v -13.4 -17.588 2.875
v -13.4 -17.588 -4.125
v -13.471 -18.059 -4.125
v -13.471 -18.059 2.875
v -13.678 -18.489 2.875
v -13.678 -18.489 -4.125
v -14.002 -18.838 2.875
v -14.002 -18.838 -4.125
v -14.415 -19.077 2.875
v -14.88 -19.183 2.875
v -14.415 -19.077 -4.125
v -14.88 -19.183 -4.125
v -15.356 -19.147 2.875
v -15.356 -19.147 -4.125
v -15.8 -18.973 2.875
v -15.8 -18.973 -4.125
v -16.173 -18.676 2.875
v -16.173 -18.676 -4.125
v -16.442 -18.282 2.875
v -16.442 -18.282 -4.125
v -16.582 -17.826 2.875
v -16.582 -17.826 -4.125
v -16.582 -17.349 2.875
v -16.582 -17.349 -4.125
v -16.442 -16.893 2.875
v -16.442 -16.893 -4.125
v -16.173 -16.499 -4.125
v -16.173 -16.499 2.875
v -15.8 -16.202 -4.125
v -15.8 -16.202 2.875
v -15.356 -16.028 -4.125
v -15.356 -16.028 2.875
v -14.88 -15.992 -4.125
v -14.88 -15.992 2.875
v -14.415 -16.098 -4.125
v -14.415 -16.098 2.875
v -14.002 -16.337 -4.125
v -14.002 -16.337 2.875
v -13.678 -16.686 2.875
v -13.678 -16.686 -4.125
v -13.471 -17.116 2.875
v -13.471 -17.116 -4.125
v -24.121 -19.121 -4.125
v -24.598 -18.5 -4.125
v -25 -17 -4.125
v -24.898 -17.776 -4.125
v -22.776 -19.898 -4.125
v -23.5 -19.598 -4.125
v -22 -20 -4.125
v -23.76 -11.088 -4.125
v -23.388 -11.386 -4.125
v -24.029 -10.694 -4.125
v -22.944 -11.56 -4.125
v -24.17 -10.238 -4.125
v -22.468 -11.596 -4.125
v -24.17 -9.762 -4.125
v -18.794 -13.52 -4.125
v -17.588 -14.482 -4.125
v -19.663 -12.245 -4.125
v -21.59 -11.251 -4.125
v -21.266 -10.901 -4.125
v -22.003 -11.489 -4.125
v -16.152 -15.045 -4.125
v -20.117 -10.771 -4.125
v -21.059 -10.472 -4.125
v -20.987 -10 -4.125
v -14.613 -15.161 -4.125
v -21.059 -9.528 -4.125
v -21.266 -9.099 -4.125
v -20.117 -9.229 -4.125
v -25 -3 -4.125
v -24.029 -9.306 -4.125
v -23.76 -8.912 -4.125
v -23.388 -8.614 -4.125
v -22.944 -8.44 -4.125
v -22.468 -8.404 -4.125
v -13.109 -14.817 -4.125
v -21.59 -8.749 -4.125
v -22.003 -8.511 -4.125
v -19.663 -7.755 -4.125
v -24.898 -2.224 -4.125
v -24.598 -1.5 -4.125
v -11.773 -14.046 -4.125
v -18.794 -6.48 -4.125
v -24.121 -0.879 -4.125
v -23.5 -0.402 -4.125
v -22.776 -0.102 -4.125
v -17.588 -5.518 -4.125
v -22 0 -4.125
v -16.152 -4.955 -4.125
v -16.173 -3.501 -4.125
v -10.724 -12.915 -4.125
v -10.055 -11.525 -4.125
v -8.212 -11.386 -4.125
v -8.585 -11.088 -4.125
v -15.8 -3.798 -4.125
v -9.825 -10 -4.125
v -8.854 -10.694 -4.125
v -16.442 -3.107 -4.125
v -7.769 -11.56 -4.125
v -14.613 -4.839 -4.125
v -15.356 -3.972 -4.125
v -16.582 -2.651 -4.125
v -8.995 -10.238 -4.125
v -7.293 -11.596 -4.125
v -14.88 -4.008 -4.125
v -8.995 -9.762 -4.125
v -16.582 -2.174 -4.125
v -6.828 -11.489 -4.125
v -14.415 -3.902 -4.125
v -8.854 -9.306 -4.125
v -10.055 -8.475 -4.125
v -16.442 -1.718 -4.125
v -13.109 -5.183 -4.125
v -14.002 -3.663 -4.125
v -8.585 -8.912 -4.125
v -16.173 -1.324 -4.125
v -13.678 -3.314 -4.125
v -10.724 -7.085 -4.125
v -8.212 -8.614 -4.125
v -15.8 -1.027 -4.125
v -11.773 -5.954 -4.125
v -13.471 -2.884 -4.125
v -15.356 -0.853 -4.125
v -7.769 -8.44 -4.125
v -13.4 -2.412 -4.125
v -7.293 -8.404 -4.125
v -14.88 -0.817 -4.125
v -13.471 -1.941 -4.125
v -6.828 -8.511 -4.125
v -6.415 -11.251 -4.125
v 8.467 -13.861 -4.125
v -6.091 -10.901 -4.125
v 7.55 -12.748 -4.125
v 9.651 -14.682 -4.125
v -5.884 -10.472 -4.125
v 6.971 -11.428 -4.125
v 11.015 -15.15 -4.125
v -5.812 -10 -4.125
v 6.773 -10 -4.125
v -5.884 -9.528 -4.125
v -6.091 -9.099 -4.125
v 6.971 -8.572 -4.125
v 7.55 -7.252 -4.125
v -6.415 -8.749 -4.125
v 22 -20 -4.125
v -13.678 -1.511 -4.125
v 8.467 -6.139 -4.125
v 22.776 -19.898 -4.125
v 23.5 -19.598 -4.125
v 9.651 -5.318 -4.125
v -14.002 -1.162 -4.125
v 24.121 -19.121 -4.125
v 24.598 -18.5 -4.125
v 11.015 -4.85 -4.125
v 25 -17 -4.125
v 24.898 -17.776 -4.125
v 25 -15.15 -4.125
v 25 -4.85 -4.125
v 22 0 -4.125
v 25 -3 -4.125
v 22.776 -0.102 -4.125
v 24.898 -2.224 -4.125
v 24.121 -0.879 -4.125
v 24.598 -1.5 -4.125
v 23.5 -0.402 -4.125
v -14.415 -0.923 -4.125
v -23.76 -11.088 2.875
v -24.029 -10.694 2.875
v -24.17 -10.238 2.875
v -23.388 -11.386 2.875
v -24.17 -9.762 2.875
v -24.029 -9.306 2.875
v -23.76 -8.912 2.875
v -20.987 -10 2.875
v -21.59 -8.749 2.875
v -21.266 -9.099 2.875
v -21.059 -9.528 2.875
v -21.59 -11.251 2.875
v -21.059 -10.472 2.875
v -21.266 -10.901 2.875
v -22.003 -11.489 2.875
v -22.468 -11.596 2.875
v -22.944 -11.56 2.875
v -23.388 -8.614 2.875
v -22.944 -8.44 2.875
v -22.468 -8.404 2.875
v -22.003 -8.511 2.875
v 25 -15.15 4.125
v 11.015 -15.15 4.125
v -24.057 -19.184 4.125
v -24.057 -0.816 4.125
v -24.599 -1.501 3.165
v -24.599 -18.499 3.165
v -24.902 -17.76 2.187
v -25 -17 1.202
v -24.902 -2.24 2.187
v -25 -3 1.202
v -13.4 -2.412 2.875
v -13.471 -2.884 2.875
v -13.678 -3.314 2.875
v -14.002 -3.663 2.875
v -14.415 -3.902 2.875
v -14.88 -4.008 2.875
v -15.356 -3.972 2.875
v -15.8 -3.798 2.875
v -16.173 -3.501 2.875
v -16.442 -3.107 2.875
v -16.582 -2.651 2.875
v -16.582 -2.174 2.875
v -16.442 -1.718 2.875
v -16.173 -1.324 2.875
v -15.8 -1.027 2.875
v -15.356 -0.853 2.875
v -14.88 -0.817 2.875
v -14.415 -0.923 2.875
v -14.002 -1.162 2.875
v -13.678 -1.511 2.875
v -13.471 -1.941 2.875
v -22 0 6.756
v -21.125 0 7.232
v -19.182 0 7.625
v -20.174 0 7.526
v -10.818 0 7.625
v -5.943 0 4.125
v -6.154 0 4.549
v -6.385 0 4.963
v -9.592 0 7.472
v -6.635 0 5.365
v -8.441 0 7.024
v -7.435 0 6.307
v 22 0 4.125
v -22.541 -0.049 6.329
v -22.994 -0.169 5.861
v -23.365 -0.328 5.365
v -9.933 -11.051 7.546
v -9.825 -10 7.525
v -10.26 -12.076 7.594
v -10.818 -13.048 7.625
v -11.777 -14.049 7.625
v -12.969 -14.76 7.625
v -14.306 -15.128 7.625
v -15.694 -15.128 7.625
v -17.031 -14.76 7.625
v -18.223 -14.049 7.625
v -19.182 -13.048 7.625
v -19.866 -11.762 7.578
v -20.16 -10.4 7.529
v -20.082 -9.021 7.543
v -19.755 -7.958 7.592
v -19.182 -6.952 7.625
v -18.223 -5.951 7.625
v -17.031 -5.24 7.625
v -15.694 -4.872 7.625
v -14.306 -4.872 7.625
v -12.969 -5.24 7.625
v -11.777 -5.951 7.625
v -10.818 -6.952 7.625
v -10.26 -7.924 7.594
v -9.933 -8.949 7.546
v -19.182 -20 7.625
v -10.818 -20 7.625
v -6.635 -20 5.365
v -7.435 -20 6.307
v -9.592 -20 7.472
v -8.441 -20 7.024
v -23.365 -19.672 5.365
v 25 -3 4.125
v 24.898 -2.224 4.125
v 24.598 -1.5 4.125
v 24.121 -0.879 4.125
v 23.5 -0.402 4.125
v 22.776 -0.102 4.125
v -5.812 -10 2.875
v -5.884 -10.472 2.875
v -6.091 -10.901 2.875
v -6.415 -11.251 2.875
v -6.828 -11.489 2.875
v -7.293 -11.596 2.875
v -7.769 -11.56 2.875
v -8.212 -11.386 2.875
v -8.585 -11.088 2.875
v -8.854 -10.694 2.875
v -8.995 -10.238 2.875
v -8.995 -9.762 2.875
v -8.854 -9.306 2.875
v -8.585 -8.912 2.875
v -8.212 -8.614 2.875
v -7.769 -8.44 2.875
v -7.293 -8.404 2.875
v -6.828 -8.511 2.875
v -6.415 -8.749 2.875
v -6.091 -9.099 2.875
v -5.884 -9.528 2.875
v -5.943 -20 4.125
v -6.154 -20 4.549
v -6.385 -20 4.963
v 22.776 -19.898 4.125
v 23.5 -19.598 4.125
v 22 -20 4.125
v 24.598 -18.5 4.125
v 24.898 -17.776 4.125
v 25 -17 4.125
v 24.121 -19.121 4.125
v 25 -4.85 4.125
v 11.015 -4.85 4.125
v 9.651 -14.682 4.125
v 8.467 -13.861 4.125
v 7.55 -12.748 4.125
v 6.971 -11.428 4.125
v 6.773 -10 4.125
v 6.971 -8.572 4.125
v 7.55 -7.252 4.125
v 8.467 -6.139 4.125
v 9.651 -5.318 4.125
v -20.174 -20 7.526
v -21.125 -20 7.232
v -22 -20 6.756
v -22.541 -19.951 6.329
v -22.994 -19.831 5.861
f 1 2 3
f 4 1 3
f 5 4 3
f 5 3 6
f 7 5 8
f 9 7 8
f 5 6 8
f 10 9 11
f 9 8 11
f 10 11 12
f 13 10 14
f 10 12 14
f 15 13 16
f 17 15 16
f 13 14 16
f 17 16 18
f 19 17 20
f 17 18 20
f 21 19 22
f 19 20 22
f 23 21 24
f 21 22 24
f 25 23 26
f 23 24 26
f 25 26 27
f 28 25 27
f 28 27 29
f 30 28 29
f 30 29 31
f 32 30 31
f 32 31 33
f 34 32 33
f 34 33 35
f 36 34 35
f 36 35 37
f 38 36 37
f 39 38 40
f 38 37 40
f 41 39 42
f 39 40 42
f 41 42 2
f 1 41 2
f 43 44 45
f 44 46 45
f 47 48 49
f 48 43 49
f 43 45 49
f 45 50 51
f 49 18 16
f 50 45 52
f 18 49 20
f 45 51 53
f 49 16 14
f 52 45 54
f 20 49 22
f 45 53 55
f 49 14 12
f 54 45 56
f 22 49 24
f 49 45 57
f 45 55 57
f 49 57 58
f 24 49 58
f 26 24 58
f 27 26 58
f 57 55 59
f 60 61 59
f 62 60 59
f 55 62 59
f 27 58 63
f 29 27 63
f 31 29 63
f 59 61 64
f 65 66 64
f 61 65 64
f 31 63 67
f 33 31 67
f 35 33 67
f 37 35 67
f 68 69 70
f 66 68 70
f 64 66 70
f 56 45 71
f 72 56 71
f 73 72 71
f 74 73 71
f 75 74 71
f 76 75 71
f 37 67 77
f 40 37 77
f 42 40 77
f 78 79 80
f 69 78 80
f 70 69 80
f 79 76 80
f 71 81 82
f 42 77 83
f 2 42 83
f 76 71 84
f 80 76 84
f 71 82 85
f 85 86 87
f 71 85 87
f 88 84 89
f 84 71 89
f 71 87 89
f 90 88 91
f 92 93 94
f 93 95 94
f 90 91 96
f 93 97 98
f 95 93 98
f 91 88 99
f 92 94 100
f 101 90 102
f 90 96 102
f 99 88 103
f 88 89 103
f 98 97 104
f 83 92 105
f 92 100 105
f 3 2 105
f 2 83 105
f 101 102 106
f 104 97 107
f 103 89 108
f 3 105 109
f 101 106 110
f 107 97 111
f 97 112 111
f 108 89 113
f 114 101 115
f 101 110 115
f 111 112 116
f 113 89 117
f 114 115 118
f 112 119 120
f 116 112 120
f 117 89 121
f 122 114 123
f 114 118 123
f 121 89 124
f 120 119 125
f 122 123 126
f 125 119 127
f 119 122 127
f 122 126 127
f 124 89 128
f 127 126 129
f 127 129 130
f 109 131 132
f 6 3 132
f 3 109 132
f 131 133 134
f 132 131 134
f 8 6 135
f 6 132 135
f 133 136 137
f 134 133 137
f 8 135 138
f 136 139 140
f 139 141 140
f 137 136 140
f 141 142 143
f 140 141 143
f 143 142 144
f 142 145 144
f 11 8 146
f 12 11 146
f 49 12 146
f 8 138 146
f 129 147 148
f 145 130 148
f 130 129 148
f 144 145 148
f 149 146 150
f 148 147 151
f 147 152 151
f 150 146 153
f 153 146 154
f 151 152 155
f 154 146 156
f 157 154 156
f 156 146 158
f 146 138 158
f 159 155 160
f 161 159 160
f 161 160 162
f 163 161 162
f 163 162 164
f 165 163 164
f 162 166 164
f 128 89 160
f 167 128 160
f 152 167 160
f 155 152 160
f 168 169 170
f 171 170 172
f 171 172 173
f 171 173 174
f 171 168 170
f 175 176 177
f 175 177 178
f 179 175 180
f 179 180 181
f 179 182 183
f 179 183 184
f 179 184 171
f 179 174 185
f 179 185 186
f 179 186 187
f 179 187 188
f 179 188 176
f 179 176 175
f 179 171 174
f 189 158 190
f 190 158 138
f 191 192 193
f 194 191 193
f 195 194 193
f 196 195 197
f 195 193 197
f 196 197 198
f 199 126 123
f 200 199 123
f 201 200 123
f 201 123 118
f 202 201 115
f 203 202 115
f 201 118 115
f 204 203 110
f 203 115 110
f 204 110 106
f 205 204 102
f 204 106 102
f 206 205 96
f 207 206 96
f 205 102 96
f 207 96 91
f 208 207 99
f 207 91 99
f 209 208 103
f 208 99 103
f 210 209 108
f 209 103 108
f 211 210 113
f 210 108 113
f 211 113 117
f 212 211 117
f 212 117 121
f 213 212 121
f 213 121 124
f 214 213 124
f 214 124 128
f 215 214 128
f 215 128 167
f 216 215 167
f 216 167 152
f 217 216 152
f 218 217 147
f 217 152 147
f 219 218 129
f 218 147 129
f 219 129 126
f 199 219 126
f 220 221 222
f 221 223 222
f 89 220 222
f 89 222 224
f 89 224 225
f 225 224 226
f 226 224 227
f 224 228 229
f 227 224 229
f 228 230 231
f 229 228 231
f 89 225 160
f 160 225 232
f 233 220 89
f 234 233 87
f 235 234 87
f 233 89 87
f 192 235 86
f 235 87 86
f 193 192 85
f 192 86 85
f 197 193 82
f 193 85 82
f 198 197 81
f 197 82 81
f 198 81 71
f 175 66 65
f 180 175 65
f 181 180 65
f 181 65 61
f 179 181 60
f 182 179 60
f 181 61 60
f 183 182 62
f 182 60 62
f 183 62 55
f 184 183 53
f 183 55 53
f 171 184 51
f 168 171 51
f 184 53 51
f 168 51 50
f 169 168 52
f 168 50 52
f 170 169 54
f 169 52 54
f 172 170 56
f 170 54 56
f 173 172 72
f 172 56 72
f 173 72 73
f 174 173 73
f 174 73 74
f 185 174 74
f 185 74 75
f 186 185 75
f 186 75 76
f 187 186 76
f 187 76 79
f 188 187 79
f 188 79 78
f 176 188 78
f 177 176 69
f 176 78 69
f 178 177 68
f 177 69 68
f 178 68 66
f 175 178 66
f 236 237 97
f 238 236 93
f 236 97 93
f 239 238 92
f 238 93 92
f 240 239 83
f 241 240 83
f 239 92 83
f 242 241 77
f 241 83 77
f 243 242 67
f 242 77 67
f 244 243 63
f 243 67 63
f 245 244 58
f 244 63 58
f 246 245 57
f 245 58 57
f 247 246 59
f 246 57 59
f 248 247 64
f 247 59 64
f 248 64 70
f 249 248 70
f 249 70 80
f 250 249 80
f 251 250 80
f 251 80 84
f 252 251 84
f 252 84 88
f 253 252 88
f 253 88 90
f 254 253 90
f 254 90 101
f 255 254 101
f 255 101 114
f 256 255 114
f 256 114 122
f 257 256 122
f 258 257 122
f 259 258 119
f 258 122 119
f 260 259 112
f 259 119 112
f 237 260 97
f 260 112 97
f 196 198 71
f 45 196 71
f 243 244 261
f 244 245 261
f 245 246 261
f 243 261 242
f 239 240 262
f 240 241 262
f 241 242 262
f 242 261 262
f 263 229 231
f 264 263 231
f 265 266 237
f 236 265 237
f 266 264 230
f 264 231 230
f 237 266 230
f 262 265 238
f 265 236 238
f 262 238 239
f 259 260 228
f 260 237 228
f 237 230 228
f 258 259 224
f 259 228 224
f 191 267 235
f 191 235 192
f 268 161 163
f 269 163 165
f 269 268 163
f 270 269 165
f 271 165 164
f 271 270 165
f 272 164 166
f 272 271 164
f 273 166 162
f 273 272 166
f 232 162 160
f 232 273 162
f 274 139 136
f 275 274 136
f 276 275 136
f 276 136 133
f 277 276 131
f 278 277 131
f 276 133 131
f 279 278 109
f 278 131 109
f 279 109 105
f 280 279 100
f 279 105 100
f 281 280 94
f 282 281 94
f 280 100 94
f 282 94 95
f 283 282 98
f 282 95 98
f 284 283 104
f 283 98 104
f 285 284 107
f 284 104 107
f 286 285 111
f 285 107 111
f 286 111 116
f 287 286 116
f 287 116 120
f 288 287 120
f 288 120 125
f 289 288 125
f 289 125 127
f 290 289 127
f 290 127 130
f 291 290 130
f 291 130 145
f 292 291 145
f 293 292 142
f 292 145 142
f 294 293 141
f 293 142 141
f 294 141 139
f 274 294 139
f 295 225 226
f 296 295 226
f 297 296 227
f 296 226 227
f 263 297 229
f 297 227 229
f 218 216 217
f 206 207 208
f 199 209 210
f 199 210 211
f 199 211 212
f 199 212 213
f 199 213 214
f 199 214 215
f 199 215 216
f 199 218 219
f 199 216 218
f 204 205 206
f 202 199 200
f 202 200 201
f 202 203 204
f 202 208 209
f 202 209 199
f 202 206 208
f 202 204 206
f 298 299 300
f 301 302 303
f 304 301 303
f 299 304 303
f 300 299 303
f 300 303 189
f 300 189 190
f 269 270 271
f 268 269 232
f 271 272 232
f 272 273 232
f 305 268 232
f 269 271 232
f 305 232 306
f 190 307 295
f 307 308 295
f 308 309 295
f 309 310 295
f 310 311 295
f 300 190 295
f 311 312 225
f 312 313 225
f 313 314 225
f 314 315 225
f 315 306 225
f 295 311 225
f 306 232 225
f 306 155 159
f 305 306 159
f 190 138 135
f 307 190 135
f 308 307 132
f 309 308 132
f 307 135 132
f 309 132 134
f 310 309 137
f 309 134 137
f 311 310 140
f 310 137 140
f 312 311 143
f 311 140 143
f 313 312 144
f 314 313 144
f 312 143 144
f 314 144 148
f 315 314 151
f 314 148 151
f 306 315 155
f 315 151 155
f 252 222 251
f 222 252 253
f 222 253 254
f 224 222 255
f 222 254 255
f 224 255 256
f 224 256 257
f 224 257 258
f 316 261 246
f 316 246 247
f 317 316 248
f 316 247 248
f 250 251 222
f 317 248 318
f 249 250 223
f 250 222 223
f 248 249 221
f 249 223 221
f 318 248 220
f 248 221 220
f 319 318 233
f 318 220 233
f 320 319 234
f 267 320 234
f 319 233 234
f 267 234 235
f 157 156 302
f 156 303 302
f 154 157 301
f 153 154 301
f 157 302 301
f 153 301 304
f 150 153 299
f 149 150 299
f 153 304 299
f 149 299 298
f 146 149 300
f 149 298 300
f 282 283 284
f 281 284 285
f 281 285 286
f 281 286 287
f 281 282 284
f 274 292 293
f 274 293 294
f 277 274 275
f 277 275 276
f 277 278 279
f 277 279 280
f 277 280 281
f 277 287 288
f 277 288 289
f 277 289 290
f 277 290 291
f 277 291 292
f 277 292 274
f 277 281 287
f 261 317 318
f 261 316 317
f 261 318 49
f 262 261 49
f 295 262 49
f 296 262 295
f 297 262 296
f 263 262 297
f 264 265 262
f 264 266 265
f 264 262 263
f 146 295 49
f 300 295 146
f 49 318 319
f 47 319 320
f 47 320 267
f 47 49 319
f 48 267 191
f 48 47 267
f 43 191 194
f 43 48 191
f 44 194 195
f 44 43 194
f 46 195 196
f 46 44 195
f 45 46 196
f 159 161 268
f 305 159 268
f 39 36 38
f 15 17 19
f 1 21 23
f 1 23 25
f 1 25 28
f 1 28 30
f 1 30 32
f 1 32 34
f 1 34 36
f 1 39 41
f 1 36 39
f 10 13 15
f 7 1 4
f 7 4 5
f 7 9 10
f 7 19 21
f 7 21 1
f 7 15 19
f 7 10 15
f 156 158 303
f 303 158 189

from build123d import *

# Parameters (mm, degrees)
F1_DEPTH     = 20
F2_R         = 1.6
F2_R_2       = 5.175
F3_DEPTH     = 7
F4_DEPTH     = 25
F5_R         = 3
F6_T1_DEPTH  = 28.6148731674
F7_DEPTH     = 25
F9_DEPTH     = 25
F10_T1_DEPTH = 35.1990481771


# Not quite as in the source:
# - a fillet or chamfer that OpenCascade refuses, or shapes differently, is made with other operations: its cross-section is extruded or revolved along the edge and cut away or added
# - a feature names something its author has since deleted; it is built from what else it names


with BuildPart() as f1:
    # F0 (on Front) → F1 (new body)
    with BuildSketch(Plane.XZ):
        with BuildLine():
            Line((-25, -4.125), (25, -4.125))
            Line((25, -4.125), (25, 4.125))
            Line((25, 4.125), (-5.9433734098, 4.125))
            ThreePointArc((-5.9433734098, 4.125), (-15, 9.8850100464), (-24.0566265902, 4.125))
            Line((-24.0566265902, 4.125), (-25, 4.125))
            Line((-25, 4.125), (-25, -4.125))
        make_face()
    extrude(amount=F1_DEPTH)

    # F2 (on face) → F3 (cut)
    with BuildSketch(Plane(origin=(0, 0, -4.125), x_dir=(1, 0, 0), z_dir=(0, 0, -1))):
        with Locations((-22.5875, 10)):
            Circle(F2_R)
        with Locations((-15, 10)):
            Circle(F2_R_2)
        with Locations((-15, 17.5875)):
            Circle(F2_R)
        with Locations((-15, 2.4125)):
            Circle(F2_R)
        with Locations((-7.4125, 10)):
            Circle(F2_R)
    extrude(amount=-F3_DEPTH, mode=Mode.SUBTRACT)

    # F4 (cut): a face of the model
    f4_faces = [f1.faces().sort_by_distance(p)[0] for p in [
        (-15, -10, 2.875),
    ]]
    extrude(f4_faces, amount=-F4_DEPTH, mode=Mode.SUBTRACT)

    # F5
    f5_edges = [f1.edges().sort_by_distance(p)[0] for p in [
        (25, 0, 0),
        (25, -20, 0),
        (-25, 0, 0),
        (-25, -20, 0),
    ]]
    fillet(f5_edges, radius=F5_R)

    # F6: fillet of radius 5 on 1 edges, made by hand

    # F6_s2 → F6_t1 (cut)
    with BuildSketch(Plane.XZ.offset(-4.3074365837)):
        with BuildLine():
            ThreePointArc((-24.0566265902, 4.125), (-24.7583155082, 2.7377445871), (-25, 1.2020253665))
            Line((-25, 1.2020253665), (-25, 4.125))
            Line((-25, 4.125), (-24.0566265902, 4.125))
        make_face()
    extrude(amount=F6_T1_DEPTH, mode=Mode.SUBTRACT)

    # F2 (on face) → F7 (cut)
    with BuildSketch(Plane(origin=(0, 0, -4.125), x_dir=(1, 0, 0), z_dir=(0, 0, -1))):
        with BuildLine():
            Line((25, 4.85), (25, 15.15))
            Line((25, 15.15), (11.0150124379, 15.15))
            ThreePointArc((11.0150124379, 15.15), (6.7728579207, 10), (11.0150124379, 4.85))
            Line((11.0150124379, 4.85), (25, 4.85))
        make_face()
    extrude(amount=-F7_DEPTH, mode=Mode.SUBTRACT)

    # F8 (on face) → F9 (cut)
    with BuildSketch(Plane.XZ.offset(20)):
        with BuildLine():
            Line((-21.3318682487, 7.625), (-8.6681317513, 7.625))
            ThreePointArc((-8.6681317513, 7.625), (-15, 9.8850100464), (-21.3318682487, 7.625))
        make_face()
    extrude(amount=-F9_DEPTH, mode=Mode.SUBTRACT)

    # F10: fillet of radius 5 on 2 edges, made by hand

    # F10_s2 → F10_t1 (cut)
    with BuildSketch(Plane.XZ.offset(-7.5995240885)):
        with BuildLine():
            ThreePointArc((-19.182398242, 7.625), (-21.55937639, 7.0238606347), (-23.3647964839, 5.3649899536))
            ThreePointArc((-23.3647964839, 5.3649899536), (-22.4347091347, 6.5726927603), (-21.3318682487, 7.625))
            Line((-21.3318682487, 7.625), (-19.182398242, 7.625))
        make_face()
        with BuildLine():
            ThreePointArc((-6.6352035161, 5.3649899536), (-8.44062361, 7.0238606347), (-10.817601758, 7.625))
            Line((-10.817601758, 7.625), (-8.6681317513, 7.625))
            ThreePointArc((-8.6681317513, 7.625), (-7.5652908653, 6.5726927603), (-6.6352035161, 5.3649899536))
        make_face()
    extrude(amount=F10_T1_DEPTH, mode=Mode.SUBTRACT)


solid = f1.part
